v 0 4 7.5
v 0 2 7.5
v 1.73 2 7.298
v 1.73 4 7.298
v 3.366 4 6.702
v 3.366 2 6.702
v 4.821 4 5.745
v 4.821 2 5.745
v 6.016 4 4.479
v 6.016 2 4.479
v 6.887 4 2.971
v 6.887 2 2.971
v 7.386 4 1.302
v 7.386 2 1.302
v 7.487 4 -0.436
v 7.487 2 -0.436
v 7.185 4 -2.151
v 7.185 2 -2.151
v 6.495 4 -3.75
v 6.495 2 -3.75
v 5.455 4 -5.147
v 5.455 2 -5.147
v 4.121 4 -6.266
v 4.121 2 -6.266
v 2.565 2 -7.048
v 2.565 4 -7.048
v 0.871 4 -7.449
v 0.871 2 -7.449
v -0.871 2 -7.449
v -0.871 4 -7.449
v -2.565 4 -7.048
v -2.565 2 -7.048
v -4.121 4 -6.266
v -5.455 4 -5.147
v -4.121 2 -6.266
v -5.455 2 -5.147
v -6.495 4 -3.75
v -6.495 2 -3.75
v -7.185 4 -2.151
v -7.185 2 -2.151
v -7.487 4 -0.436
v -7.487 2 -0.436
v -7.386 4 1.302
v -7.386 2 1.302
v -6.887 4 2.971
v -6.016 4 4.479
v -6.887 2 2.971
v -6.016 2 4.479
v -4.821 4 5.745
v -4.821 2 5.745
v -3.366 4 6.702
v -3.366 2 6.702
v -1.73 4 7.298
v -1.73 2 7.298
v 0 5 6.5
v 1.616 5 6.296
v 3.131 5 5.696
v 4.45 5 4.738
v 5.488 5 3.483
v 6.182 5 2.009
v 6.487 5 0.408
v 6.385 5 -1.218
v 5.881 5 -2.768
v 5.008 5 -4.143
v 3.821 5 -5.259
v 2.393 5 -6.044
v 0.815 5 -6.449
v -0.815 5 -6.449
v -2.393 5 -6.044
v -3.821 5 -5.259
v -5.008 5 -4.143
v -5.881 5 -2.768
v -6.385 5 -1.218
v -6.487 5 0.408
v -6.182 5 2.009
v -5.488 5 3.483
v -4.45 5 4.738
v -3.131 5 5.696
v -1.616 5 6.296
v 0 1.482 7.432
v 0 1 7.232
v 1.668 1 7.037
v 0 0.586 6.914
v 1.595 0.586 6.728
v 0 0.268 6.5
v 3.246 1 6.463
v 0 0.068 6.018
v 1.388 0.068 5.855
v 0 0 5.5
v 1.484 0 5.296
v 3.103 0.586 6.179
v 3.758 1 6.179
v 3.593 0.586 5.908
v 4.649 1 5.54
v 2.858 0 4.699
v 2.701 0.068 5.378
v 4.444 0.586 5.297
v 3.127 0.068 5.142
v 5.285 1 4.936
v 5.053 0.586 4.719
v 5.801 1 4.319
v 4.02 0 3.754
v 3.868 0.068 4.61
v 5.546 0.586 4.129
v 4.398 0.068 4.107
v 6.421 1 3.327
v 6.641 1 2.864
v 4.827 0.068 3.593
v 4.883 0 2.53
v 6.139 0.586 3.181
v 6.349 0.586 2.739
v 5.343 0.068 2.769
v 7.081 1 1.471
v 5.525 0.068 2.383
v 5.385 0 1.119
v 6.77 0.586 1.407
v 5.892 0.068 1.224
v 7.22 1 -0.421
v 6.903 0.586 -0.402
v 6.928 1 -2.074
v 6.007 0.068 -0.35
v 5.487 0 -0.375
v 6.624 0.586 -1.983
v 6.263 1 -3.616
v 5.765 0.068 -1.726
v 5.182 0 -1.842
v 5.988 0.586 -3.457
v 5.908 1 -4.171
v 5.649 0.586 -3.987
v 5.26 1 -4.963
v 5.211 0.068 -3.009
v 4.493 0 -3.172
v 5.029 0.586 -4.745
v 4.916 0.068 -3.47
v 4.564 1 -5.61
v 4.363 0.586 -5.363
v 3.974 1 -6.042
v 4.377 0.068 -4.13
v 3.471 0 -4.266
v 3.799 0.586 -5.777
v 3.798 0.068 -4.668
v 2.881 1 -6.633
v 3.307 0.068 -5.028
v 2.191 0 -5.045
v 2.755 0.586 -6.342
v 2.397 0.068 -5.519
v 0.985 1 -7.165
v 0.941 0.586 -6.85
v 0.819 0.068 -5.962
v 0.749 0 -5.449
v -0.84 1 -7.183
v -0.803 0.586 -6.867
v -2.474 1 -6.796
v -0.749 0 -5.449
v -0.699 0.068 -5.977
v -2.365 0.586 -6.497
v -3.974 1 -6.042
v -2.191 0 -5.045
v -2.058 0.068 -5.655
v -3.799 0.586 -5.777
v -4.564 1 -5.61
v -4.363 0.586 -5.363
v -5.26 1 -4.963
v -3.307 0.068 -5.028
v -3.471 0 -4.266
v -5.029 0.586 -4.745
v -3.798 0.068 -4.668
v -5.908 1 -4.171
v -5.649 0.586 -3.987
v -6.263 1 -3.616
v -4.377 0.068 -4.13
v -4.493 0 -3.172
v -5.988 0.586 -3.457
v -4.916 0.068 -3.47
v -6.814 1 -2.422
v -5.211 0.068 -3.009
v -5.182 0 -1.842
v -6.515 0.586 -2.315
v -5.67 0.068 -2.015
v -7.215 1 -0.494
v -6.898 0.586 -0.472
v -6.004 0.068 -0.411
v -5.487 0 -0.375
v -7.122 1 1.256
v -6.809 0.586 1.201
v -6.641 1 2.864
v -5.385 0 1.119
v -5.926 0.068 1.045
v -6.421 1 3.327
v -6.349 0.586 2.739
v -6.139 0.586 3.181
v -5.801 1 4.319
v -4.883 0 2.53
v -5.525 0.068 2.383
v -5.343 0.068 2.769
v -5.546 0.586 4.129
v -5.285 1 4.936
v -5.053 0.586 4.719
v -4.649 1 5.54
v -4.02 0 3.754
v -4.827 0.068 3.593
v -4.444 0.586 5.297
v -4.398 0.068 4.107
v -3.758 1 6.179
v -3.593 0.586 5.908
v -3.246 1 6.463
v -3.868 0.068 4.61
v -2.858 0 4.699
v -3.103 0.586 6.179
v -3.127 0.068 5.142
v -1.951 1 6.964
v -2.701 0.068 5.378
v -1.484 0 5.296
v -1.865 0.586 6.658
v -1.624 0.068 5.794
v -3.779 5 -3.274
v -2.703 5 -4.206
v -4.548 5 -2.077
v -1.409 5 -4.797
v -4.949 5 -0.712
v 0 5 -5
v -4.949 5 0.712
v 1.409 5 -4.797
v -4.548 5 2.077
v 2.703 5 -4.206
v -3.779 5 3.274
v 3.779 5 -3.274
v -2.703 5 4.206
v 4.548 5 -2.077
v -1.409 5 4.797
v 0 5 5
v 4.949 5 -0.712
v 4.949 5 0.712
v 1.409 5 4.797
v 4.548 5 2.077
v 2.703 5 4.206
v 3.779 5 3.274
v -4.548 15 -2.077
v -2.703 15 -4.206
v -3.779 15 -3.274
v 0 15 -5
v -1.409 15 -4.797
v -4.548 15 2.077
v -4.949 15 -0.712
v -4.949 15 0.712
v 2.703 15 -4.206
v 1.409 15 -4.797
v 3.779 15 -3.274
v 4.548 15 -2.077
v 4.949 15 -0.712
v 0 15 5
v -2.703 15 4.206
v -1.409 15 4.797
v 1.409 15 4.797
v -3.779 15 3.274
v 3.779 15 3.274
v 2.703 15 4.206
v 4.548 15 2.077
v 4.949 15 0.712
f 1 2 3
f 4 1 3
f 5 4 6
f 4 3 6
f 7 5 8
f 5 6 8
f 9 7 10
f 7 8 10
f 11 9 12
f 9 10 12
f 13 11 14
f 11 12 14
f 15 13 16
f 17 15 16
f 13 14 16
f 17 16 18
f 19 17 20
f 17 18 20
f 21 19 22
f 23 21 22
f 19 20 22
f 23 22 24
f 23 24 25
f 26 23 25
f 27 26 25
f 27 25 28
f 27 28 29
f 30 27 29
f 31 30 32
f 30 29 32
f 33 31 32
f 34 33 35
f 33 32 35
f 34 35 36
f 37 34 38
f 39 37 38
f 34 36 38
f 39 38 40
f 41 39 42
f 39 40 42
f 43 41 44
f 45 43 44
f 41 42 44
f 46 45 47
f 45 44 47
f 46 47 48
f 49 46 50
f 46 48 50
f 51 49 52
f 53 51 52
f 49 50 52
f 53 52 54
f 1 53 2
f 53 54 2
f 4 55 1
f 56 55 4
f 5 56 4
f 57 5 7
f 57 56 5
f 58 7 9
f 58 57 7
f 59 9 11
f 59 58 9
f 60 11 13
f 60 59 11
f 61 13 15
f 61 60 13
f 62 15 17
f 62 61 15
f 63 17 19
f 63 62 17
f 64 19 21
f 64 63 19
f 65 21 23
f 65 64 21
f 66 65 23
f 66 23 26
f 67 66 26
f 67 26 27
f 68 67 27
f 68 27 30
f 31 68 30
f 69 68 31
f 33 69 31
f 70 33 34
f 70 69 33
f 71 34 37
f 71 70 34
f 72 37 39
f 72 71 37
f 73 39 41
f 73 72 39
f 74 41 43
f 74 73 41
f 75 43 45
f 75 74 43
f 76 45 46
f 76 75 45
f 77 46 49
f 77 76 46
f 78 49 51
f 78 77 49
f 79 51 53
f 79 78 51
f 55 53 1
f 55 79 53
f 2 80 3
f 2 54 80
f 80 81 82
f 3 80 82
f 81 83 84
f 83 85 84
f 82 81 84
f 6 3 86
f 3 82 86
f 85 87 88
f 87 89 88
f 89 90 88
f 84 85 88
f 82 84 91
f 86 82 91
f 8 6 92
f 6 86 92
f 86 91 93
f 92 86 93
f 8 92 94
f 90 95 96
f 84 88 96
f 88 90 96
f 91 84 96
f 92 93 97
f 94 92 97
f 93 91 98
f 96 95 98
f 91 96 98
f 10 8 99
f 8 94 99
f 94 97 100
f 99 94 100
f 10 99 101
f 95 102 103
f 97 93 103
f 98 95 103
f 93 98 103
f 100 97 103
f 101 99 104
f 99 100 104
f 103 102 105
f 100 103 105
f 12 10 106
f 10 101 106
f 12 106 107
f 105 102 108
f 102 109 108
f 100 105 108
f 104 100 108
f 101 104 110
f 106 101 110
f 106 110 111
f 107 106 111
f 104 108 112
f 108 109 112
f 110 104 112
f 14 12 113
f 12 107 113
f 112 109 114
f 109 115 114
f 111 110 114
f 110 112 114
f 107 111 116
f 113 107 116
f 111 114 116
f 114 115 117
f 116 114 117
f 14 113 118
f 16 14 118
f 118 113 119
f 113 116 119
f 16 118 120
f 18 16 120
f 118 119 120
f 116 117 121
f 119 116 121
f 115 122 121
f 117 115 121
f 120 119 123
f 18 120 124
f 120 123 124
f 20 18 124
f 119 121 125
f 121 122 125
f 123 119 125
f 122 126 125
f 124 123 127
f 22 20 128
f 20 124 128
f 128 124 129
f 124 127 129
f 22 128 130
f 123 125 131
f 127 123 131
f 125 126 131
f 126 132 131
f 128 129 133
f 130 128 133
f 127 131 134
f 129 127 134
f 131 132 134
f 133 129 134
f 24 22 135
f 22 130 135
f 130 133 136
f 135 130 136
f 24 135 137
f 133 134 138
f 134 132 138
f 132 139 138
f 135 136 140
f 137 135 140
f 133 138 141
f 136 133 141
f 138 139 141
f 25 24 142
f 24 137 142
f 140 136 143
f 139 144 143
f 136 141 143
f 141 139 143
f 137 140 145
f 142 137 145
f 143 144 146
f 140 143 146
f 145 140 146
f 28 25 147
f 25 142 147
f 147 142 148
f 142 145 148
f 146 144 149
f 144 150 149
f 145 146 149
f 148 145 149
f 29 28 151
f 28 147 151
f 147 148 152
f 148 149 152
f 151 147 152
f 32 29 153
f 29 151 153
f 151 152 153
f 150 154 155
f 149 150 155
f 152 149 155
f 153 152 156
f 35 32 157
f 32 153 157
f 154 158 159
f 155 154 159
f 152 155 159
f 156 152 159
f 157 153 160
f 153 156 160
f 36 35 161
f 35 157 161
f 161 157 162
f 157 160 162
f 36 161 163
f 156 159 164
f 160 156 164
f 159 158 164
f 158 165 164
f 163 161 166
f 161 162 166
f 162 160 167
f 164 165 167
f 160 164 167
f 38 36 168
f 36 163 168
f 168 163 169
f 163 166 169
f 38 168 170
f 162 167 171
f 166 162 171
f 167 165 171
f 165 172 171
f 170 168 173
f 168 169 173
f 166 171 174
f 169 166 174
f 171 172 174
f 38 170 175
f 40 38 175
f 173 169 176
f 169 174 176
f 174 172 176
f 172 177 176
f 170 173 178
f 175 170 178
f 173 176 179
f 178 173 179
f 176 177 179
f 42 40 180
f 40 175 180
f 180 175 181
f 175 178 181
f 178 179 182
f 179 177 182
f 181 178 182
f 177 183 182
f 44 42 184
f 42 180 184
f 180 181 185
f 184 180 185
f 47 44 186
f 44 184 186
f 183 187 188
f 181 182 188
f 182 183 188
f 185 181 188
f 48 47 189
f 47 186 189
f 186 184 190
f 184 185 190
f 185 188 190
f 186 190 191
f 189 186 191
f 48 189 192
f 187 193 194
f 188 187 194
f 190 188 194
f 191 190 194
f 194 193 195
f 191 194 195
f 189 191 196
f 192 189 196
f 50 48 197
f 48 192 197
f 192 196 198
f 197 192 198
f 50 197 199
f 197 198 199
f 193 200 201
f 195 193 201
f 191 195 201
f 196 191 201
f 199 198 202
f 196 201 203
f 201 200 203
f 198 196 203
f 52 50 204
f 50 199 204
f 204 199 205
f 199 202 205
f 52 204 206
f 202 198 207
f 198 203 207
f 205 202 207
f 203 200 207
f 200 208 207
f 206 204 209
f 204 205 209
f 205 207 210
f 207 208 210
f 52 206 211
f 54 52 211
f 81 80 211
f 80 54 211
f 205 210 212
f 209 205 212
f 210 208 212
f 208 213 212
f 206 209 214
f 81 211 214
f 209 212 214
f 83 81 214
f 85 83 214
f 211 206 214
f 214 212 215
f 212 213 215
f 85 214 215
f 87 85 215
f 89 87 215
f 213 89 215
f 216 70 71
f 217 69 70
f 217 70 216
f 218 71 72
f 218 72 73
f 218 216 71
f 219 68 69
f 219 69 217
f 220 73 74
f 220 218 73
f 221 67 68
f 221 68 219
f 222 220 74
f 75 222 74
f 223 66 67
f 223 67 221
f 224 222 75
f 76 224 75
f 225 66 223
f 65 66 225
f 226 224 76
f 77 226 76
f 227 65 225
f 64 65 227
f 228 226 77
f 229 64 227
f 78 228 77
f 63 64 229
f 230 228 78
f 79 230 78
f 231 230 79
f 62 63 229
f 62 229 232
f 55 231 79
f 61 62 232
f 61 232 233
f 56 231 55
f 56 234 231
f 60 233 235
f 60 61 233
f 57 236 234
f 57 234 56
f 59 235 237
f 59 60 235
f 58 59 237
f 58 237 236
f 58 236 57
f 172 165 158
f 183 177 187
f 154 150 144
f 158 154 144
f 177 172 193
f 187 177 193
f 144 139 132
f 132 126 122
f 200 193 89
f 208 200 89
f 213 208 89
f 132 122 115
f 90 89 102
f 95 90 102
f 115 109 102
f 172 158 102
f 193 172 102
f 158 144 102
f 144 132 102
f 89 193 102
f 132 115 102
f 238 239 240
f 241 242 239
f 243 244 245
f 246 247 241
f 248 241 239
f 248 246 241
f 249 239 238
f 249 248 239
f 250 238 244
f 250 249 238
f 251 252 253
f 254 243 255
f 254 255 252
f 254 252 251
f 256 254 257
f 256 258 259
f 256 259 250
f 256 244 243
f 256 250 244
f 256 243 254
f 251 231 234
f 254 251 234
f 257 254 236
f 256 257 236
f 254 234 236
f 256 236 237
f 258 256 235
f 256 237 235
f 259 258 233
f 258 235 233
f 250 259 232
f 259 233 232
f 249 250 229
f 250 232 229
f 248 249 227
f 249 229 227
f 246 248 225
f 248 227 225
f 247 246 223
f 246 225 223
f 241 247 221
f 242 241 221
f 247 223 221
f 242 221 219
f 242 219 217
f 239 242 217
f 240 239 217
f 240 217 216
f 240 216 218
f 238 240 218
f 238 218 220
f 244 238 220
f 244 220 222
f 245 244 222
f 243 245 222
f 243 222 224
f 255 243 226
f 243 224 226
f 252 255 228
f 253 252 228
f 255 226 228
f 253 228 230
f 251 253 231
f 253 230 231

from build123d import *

# Parameters (mm, degrees)
SKETCH1_R           = 7.5
BOSS_EXTRUDE1_DEPTH = 5
FILLET1_R           = 2
SKETCH2_R           = 5
BOSS_EXTRUDE2_DEPTH = 10
CHAMFER2_SIZE       = 1


with BuildPart() as part:
    # Sketch1 → Boss-Extrude1 (new body)
    with BuildSketch(Plane(origin=(0, 0, 0), x_dir=(1, 0, 0), z_dir=(0, 1, 0))):
        with Locations(Location((0, 0, 0), (0, 0, 270))):
            Circle(SKETCH1_R)
    extrude(amount=BOSS_EXTRUDE1_DEPTH)

    # Fillet1
    fillet1_edges = [part.edges().sort_by_distance(p)[0] for p in [
        (0, 0, -7.5),
    ]]
    fillet(fillet1_edges, radius=FILLET1_R)

    # Sketch2 → Boss-Extrude2 (add)
    with BuildSketch(Plane(origin=(0, 5, 0), x_dir=(1, 0, 0), z_dir=(0, 1, 0))):
        with Locations(Location((0, 0, 0), (0, 0, 270))):
            Circle(SKETCH2_R)
    extrude(amount=BOSS_EXTRUDE2_DEPTH)

    # Chamfer2
    chamfer2_edges = [part.edges().sort_by_distance(p)[0] for p in [
        (0, 5, -7.5),
    ]]
    chamfer(chamfer2_edges, length=CHAMFER2_SIZE)


solid = part.part
